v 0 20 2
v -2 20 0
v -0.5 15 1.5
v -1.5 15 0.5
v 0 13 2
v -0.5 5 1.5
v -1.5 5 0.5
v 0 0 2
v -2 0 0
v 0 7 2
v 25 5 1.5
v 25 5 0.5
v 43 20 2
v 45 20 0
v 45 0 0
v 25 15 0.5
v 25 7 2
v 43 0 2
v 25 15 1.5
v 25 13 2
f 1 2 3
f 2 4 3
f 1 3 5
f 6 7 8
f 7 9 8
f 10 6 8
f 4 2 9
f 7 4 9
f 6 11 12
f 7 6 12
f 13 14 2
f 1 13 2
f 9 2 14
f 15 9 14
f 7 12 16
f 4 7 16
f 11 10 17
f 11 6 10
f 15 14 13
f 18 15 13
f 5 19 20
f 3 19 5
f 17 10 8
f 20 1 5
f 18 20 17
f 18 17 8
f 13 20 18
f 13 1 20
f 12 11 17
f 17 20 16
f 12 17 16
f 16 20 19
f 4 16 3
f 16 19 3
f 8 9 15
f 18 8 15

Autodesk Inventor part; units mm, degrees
ref_plane "YZ Plane" through (0, 0, 0) normal (1, 0, 0) x (0, 1, 0)
ref_plane "XZ Plane" through (0, 0, 0) normal (0, 1, 0) x (-1, 0, 0)
ref_plane "XY Plane" through (0, 0, 0) normal (0, 0, 1) x (1, 0, 0)
sketch "Sketch1" plane through (0, 0, 0) normal (0, 0, 1) x (1, 0, 0)
  line L0 (0, 0) -> (43, 0)
  line L1 (43, 0) -> (43, 20)
  line L2 (43, 20) -> (0, 20)
  line L3 (0, 20) -> (0, 0)
  dimension "d0" = 43
  dimension "d1" = 20
extrude "Extrusion1" add sketch "Sketch1" along normal blind 2
sketch "Sketch2" plane through (0, 0, 0) normal (0, -1, 0) x (1, 0, 0)
  line L0 (43, 0) -> (43, 2) projected
  line L1 (0, 0) -> (0, 2) projected
  line L2 (0, 0) -> (-2, 0)
  line L3 (-2, 0) -> (0, 2)
  line L4 (43, 0) -> (45, 0)
  line L5 (45, 0) -> (43, 2)
  dimension "d4" = 2
  dimension "d5" = 2
extrude "Extrusion2" add sketch "Sketch2" against normal blind 20
sketch "Sketch5" plane through (0, 0, 2) normal (0, 0, 1) x (1, 0, 0)
  line L0 (0, 0) -> (43, 0) projected
  line L1 (43, 20) -> (0, 20) projected
  line L2 (0, 20) -> (0, 0) projected
  line L3 (5, 5) -> (25, 5)
  line L4 (25, 5) -> (25, 15)
  line L5 (25, 15) -> (5, 15)
  line L6 (5, 15) -> (5, 5)
  dimension "d26" = 20
  dimension "d27" = 10
  dimension "d28" = 5
  dimension "d29" = 5
  dimension "d30" = 5
extrude "Extrusion5" cut sketch "Sketch5" against normal blind 1.5
sketch "Sketch6" plane through (5, 5, 2) normal (1, 0, 0) x (0, 0, -1)
  line L0 (0, 0) -> (0, 10) projected
  line L1 (0, 0) -> (1.5, 0) projected
  line L2 (1.5, 0) -> (1.5, 10) projected
  line L3 (0, 10) -> (1.5, 10) projected
  point P0 (2, -5)
extrude "Extrusion6" cut sketch "Sketch6" against normal up to next
sketch "Sketch7" plane through (0, 15, 2) normal (0, -1, 0) x (1, 0, 0)
  line L0 (0, 0) -> (25, 0) projected
  line L1 (-1.5, -1.5) -> (0, 0) projected
  line L2 (25, 0) -> (0, 0)
  line L3 (0, 0) -> (0, -0.5)
  line L4 (0, -0.5) -> (25, -0.5)
  line L5 (25, -0.5) -> (25, 0)
  line L6 (0, -0.5) -> (-0.5, -0.5)
  line L7 (0, 0) -> (-0.5, -0.5)
  point P0 (0, -2)
  dimension "d35" = 0.5
extrude "Extrusion7" add sketch "Sketch7" along normal blind 2
sketch "Sketch8" plane through (0, 5, 2) normal (0, 1, 0) x (1, 0, 0)
  line L0 (0, 0) -> (-1.5, 1.5) projected
  line L1 (25, 0) -> (0, 0)
  line L2 (0, 0) -> (0, 0.5)
  line L3 (0, 0.5) -> (25, 0.5)
  line L4 (25, 0.5) -> (25, 0)
  line L5 (0, 0.5) -> (-0.5, 0.5)
  line L6 (0, 0) -> (-0.5, 0.5)
  point P0 (0, 2)
  dimension "d38" = 25
  dimension "d39" = 0.5
extrude "Extrusion8" add sketch "Sketch8" along normal blind 2
chamfer "Chamfer1" distance 0.5 distance2 2 1 edges at (12.25, 7, 1.5) measured on face at (8.1667, 7, 1.6667)
chamfer "Chamfer2" distance 0.5 distance2 2 1 edges at (12.25, 13, 1.5) measured on face at (8.1667, 13, 1.6667)
properties part number "deksel token Edited"
